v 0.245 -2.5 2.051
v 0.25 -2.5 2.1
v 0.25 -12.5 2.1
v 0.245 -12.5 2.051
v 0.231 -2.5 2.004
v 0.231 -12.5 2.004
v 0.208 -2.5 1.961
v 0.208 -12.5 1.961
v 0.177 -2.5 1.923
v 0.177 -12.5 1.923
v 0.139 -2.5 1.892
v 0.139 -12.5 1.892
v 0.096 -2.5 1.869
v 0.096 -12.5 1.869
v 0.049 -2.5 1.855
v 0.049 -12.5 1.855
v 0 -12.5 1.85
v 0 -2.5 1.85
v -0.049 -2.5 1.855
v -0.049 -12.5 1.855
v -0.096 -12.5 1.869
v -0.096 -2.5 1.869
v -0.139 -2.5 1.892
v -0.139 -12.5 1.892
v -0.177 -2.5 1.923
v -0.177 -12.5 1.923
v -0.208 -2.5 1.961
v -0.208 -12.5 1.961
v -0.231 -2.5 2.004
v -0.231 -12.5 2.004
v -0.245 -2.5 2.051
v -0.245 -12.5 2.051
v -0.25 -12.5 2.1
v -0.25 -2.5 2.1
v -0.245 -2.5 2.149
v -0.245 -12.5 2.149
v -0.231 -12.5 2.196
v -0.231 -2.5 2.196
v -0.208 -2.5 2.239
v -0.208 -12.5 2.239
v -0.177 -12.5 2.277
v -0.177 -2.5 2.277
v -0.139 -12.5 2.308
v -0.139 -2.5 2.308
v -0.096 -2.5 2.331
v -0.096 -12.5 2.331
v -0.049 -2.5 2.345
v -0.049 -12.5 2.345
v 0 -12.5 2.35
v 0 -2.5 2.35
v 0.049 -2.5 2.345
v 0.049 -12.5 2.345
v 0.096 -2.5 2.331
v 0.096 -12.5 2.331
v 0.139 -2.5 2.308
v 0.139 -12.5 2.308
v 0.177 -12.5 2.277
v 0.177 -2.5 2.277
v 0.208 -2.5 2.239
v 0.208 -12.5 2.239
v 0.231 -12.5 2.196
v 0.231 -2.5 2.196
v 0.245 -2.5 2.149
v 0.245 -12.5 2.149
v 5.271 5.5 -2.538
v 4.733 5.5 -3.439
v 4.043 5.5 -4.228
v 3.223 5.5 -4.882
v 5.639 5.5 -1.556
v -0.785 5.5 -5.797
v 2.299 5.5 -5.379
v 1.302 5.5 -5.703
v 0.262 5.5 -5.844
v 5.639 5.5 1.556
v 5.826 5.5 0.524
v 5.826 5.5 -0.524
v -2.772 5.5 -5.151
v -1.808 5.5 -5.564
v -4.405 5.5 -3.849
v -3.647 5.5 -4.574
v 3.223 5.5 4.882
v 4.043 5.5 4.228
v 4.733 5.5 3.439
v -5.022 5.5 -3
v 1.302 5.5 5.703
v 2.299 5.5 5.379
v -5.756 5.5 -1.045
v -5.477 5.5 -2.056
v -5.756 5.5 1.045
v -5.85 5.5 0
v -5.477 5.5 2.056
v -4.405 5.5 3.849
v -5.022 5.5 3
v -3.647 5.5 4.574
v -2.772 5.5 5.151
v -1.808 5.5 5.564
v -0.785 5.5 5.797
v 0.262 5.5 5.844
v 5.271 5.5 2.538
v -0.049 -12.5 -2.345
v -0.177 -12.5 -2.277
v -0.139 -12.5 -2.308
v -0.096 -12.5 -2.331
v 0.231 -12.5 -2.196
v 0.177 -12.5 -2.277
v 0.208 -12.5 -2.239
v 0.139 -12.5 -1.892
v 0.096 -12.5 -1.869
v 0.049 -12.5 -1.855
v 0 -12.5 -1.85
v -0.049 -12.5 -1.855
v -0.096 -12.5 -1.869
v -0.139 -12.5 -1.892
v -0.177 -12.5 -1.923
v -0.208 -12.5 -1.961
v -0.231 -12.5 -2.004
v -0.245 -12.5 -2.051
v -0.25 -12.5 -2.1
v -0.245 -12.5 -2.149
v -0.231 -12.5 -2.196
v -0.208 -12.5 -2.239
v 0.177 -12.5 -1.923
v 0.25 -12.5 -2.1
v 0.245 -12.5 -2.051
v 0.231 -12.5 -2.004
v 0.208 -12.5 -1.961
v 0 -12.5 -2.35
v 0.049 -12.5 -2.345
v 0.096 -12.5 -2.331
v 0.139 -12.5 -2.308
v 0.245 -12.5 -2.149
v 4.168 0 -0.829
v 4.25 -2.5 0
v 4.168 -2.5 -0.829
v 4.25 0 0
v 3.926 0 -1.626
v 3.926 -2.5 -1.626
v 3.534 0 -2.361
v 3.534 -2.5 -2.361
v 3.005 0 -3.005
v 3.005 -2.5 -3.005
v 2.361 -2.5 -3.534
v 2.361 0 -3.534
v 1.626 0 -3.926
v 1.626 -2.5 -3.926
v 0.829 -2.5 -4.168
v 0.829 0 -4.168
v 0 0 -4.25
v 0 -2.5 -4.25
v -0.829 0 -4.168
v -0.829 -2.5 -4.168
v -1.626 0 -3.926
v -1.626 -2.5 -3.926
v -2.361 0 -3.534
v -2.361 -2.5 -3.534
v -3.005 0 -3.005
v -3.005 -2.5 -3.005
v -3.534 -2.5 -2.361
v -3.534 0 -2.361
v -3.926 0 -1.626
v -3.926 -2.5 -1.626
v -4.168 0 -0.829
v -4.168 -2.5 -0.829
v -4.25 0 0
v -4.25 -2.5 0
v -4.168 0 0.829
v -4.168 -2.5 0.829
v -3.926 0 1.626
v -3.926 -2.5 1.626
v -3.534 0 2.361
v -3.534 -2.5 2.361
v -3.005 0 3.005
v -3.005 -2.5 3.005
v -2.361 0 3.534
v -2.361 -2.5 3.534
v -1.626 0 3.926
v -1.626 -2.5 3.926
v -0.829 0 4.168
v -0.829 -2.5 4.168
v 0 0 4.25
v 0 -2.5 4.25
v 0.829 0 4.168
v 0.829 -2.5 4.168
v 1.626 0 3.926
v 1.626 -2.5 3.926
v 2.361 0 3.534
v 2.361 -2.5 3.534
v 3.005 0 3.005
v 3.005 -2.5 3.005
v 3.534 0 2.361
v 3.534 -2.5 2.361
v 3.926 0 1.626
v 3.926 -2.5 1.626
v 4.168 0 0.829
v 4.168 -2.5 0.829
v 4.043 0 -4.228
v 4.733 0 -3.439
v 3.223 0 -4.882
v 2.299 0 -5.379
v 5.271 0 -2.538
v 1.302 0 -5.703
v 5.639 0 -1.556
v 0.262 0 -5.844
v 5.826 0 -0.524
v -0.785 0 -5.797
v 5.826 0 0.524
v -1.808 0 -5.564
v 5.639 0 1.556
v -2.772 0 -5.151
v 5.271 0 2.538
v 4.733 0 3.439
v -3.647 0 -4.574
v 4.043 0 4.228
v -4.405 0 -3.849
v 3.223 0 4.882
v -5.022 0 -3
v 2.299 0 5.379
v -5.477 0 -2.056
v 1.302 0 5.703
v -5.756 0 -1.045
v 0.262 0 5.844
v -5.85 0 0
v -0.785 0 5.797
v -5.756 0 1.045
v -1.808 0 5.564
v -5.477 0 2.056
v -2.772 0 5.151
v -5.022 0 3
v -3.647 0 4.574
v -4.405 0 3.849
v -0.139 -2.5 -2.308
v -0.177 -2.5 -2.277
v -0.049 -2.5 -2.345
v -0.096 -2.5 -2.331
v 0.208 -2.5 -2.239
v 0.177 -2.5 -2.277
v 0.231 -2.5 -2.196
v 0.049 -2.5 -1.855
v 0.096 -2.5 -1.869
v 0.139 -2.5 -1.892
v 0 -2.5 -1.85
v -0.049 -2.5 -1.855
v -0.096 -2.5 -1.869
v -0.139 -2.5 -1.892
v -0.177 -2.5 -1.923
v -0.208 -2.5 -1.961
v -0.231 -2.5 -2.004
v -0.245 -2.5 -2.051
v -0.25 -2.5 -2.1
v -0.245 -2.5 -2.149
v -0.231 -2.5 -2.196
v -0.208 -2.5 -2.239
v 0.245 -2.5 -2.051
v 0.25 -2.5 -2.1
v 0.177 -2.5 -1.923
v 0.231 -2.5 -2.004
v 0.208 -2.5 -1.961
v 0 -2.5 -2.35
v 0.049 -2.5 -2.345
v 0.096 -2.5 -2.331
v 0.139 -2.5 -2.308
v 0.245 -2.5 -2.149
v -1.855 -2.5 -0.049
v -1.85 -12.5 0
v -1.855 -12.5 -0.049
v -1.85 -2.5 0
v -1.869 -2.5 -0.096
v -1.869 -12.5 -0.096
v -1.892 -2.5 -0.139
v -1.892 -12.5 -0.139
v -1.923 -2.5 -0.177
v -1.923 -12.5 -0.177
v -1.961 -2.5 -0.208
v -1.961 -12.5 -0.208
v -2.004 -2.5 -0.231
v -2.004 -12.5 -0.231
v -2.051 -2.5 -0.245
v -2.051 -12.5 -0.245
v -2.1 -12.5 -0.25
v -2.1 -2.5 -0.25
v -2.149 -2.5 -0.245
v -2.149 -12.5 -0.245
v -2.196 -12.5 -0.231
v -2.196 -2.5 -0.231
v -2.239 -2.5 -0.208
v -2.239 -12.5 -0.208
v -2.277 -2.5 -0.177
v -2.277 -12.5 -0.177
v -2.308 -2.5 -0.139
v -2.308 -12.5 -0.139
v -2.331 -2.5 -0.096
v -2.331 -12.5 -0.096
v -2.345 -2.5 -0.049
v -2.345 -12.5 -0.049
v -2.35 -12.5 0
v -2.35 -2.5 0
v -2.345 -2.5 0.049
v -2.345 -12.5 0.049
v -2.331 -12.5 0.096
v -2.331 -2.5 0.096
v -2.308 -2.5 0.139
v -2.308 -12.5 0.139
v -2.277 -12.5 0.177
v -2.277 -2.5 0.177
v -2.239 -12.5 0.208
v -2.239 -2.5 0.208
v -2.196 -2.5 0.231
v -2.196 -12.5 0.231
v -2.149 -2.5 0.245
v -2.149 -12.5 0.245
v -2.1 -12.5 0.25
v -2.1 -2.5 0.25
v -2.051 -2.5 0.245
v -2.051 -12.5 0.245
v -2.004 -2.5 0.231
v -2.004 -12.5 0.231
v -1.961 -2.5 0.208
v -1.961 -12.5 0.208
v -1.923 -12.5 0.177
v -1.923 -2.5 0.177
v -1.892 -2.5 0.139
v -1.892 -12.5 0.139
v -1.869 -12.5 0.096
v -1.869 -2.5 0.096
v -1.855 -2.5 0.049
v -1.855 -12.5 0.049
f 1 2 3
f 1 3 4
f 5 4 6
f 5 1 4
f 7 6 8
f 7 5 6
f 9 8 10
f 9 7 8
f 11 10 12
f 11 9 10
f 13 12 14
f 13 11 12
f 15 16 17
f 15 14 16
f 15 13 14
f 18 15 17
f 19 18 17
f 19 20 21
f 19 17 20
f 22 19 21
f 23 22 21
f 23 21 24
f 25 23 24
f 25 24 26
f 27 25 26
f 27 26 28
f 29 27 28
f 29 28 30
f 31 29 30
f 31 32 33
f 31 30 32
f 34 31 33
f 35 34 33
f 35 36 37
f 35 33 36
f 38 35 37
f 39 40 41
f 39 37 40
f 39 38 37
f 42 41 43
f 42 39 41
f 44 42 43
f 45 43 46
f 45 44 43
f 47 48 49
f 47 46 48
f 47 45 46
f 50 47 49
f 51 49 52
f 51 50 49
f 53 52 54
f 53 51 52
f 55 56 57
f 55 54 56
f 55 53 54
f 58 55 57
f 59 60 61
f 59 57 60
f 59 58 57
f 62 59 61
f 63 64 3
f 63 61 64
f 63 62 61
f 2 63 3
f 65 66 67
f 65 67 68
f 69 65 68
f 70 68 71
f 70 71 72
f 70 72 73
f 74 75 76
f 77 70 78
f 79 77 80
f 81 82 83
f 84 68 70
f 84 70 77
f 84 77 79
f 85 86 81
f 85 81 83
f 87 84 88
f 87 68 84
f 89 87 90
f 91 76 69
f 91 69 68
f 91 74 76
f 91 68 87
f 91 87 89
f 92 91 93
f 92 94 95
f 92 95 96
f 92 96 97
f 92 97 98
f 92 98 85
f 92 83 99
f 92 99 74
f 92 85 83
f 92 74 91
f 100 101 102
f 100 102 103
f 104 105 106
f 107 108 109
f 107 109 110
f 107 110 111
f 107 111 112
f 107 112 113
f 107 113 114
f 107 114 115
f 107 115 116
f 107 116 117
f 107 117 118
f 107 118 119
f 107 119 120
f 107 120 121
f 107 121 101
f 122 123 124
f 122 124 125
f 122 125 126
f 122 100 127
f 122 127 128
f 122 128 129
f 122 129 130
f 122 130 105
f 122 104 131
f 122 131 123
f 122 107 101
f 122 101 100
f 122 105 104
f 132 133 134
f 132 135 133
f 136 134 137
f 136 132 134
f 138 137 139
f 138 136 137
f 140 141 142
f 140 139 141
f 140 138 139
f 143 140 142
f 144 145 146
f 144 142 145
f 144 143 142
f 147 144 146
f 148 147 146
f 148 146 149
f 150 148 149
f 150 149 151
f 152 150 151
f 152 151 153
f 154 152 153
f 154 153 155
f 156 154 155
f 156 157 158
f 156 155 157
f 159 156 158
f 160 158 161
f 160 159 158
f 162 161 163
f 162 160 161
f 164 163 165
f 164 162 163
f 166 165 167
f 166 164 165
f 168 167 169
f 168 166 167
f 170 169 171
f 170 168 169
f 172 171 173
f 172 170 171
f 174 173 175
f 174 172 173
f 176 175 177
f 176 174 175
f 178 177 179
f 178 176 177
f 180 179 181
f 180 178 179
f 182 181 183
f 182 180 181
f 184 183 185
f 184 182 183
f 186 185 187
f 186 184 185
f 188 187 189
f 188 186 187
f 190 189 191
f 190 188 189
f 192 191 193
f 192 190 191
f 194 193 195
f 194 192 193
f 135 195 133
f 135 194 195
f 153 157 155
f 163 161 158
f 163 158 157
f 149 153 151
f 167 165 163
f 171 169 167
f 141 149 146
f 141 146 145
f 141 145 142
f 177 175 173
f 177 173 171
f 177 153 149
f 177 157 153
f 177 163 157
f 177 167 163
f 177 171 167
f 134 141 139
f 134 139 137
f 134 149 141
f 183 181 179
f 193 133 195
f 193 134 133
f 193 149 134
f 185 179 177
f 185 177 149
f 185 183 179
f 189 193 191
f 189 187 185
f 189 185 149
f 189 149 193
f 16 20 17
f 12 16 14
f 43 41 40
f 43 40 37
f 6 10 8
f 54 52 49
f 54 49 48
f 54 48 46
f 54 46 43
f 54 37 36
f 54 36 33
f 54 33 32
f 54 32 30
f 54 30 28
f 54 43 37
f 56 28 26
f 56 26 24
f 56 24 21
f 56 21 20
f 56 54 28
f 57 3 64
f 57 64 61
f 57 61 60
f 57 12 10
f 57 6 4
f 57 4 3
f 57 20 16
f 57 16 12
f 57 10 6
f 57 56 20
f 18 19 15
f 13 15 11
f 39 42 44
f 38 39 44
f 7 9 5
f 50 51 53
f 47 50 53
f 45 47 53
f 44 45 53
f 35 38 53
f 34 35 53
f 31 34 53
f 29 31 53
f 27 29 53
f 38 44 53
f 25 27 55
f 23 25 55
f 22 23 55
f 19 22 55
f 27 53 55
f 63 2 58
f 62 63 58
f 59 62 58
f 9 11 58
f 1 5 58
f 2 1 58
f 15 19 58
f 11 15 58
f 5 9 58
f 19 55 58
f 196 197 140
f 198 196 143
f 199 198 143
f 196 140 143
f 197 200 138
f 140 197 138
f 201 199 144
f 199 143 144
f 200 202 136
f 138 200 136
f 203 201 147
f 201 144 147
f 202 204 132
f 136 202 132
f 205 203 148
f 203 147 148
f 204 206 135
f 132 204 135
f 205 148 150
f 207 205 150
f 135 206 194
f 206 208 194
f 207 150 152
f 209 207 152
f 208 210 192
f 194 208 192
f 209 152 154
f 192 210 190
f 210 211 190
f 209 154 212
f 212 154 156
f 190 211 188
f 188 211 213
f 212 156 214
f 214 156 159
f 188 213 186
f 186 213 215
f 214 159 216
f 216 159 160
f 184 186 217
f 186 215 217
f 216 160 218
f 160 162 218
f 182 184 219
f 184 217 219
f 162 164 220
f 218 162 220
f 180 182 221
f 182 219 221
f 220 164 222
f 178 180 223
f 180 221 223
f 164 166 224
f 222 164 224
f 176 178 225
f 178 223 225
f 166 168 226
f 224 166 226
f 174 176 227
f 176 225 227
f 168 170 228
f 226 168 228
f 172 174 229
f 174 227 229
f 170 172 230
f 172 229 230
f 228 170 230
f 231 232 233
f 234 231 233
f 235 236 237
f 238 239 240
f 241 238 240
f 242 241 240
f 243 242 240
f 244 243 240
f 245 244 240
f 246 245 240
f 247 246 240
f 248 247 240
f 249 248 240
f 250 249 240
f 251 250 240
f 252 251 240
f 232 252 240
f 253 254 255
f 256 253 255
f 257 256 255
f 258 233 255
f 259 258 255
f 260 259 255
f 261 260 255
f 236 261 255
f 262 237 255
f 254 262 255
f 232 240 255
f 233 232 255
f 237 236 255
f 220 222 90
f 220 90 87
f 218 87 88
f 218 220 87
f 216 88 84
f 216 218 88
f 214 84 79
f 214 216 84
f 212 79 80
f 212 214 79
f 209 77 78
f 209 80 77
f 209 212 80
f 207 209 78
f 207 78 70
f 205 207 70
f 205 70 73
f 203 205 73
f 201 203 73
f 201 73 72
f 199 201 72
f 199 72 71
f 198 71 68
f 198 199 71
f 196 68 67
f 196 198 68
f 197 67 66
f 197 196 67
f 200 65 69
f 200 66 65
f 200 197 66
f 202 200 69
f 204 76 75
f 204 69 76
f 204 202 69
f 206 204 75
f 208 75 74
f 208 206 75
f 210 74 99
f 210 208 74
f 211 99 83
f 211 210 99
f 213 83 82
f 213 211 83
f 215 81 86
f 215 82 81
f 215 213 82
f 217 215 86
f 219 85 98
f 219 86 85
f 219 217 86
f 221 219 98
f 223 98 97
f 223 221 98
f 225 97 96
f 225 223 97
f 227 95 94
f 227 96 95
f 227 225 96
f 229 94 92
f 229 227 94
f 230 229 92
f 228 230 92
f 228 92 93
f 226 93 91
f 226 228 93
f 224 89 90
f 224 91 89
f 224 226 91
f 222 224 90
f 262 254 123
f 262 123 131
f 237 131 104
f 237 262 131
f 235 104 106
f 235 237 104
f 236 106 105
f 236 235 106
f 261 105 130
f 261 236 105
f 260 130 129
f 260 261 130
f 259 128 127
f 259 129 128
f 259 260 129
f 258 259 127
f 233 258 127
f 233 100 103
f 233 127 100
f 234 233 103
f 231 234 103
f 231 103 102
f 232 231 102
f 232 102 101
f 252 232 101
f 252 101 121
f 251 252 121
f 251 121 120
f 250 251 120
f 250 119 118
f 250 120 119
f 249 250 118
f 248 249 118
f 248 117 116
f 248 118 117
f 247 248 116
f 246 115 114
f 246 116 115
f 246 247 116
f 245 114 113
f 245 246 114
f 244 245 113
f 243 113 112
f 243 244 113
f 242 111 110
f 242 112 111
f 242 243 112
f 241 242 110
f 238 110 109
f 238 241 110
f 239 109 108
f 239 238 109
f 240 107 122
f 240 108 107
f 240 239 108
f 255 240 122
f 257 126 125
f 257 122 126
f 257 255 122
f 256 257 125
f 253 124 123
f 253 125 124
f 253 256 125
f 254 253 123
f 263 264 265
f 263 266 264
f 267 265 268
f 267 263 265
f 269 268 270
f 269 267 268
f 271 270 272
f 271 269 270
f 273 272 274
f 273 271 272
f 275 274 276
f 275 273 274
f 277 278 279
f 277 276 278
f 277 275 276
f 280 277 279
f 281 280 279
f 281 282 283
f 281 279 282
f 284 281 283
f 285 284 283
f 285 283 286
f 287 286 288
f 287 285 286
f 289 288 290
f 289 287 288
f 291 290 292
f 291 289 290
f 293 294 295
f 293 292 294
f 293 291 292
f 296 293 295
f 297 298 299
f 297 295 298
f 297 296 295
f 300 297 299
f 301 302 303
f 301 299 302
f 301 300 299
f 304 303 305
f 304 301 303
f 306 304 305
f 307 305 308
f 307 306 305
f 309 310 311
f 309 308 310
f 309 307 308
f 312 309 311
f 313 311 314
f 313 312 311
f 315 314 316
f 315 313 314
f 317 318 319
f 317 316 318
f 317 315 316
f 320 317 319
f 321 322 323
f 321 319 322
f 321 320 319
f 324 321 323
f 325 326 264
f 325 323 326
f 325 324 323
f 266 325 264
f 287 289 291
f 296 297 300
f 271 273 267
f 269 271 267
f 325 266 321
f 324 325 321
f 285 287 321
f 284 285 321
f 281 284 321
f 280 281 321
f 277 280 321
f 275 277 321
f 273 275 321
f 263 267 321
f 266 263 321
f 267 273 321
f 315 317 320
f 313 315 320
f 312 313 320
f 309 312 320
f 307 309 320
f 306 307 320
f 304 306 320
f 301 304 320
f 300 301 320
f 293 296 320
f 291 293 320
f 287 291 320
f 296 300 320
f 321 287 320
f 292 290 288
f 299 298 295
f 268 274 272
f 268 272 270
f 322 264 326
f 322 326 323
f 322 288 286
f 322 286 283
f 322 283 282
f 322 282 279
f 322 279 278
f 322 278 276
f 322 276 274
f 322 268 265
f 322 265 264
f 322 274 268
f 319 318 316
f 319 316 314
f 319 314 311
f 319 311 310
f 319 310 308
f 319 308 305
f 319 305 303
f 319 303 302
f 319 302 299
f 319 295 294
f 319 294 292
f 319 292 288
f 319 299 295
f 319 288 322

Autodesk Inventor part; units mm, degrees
ref_plane "YZ Plane" through (0, 0, 0) normal (1, 0, 0) x (0, 1, 0)
ref_plane "XZ Plane" through (0, 0, 0) normal (0, 1, 0) x (-1, 0, 0)
ref_plane "XY Plane" through (0, 0, 0) normal (0, 0, 1) x (1, 0, 0)
sketch "Эскиз1" plane through (0, 0, 0) normal (0, 1, 0) x (-1, 0, 0)
  circle A0 centre (0, 0) radius 5.85
  dimension "d2" = 11.7
extrude "Выдавливание1" add sketch "Эскиз1" along normal blind 5.5
sketch "Эскиз2" plane through (0, 0, 0) normal (0, -1, 0) x (1, 0, 0)
  circle A0 centre (0, 0) radius 4.25
  dimension "d5" = 8.5
extrude "Выдавливание2" add sketch "Эскиз2" along normal blind 2.5
sketch "Эскиз3" plane through (0, -2.5, 0) normal (0, -1, 0) x (1, 0, 0)
  circle A0 centre (0, 0) radius 2.1 construction
  circle A1 centre (0, 2.1) radius 0.25
  circle A2 centre (-2.1, 0) radius 0.25
  circle A3 centre (0, -2.1) radius 0.25
  dimension "d6" = 4.2
  dimension "d7" = 0.5
  dimension "d8" = 0.5
  dimension "d9" = 0.5
extrude "Выдавливание3" add sketch "Эскиз3" along normal blind 10 separate body contours A1
extrude "Выдавливание4" add sketch "Эскиз3" along normal blind 10 separate body contours A2
extrude "Выдавливание5" add sketch "Эскиз3" along normal blind 10 separate body contours A3
properties part number "МП41А"
